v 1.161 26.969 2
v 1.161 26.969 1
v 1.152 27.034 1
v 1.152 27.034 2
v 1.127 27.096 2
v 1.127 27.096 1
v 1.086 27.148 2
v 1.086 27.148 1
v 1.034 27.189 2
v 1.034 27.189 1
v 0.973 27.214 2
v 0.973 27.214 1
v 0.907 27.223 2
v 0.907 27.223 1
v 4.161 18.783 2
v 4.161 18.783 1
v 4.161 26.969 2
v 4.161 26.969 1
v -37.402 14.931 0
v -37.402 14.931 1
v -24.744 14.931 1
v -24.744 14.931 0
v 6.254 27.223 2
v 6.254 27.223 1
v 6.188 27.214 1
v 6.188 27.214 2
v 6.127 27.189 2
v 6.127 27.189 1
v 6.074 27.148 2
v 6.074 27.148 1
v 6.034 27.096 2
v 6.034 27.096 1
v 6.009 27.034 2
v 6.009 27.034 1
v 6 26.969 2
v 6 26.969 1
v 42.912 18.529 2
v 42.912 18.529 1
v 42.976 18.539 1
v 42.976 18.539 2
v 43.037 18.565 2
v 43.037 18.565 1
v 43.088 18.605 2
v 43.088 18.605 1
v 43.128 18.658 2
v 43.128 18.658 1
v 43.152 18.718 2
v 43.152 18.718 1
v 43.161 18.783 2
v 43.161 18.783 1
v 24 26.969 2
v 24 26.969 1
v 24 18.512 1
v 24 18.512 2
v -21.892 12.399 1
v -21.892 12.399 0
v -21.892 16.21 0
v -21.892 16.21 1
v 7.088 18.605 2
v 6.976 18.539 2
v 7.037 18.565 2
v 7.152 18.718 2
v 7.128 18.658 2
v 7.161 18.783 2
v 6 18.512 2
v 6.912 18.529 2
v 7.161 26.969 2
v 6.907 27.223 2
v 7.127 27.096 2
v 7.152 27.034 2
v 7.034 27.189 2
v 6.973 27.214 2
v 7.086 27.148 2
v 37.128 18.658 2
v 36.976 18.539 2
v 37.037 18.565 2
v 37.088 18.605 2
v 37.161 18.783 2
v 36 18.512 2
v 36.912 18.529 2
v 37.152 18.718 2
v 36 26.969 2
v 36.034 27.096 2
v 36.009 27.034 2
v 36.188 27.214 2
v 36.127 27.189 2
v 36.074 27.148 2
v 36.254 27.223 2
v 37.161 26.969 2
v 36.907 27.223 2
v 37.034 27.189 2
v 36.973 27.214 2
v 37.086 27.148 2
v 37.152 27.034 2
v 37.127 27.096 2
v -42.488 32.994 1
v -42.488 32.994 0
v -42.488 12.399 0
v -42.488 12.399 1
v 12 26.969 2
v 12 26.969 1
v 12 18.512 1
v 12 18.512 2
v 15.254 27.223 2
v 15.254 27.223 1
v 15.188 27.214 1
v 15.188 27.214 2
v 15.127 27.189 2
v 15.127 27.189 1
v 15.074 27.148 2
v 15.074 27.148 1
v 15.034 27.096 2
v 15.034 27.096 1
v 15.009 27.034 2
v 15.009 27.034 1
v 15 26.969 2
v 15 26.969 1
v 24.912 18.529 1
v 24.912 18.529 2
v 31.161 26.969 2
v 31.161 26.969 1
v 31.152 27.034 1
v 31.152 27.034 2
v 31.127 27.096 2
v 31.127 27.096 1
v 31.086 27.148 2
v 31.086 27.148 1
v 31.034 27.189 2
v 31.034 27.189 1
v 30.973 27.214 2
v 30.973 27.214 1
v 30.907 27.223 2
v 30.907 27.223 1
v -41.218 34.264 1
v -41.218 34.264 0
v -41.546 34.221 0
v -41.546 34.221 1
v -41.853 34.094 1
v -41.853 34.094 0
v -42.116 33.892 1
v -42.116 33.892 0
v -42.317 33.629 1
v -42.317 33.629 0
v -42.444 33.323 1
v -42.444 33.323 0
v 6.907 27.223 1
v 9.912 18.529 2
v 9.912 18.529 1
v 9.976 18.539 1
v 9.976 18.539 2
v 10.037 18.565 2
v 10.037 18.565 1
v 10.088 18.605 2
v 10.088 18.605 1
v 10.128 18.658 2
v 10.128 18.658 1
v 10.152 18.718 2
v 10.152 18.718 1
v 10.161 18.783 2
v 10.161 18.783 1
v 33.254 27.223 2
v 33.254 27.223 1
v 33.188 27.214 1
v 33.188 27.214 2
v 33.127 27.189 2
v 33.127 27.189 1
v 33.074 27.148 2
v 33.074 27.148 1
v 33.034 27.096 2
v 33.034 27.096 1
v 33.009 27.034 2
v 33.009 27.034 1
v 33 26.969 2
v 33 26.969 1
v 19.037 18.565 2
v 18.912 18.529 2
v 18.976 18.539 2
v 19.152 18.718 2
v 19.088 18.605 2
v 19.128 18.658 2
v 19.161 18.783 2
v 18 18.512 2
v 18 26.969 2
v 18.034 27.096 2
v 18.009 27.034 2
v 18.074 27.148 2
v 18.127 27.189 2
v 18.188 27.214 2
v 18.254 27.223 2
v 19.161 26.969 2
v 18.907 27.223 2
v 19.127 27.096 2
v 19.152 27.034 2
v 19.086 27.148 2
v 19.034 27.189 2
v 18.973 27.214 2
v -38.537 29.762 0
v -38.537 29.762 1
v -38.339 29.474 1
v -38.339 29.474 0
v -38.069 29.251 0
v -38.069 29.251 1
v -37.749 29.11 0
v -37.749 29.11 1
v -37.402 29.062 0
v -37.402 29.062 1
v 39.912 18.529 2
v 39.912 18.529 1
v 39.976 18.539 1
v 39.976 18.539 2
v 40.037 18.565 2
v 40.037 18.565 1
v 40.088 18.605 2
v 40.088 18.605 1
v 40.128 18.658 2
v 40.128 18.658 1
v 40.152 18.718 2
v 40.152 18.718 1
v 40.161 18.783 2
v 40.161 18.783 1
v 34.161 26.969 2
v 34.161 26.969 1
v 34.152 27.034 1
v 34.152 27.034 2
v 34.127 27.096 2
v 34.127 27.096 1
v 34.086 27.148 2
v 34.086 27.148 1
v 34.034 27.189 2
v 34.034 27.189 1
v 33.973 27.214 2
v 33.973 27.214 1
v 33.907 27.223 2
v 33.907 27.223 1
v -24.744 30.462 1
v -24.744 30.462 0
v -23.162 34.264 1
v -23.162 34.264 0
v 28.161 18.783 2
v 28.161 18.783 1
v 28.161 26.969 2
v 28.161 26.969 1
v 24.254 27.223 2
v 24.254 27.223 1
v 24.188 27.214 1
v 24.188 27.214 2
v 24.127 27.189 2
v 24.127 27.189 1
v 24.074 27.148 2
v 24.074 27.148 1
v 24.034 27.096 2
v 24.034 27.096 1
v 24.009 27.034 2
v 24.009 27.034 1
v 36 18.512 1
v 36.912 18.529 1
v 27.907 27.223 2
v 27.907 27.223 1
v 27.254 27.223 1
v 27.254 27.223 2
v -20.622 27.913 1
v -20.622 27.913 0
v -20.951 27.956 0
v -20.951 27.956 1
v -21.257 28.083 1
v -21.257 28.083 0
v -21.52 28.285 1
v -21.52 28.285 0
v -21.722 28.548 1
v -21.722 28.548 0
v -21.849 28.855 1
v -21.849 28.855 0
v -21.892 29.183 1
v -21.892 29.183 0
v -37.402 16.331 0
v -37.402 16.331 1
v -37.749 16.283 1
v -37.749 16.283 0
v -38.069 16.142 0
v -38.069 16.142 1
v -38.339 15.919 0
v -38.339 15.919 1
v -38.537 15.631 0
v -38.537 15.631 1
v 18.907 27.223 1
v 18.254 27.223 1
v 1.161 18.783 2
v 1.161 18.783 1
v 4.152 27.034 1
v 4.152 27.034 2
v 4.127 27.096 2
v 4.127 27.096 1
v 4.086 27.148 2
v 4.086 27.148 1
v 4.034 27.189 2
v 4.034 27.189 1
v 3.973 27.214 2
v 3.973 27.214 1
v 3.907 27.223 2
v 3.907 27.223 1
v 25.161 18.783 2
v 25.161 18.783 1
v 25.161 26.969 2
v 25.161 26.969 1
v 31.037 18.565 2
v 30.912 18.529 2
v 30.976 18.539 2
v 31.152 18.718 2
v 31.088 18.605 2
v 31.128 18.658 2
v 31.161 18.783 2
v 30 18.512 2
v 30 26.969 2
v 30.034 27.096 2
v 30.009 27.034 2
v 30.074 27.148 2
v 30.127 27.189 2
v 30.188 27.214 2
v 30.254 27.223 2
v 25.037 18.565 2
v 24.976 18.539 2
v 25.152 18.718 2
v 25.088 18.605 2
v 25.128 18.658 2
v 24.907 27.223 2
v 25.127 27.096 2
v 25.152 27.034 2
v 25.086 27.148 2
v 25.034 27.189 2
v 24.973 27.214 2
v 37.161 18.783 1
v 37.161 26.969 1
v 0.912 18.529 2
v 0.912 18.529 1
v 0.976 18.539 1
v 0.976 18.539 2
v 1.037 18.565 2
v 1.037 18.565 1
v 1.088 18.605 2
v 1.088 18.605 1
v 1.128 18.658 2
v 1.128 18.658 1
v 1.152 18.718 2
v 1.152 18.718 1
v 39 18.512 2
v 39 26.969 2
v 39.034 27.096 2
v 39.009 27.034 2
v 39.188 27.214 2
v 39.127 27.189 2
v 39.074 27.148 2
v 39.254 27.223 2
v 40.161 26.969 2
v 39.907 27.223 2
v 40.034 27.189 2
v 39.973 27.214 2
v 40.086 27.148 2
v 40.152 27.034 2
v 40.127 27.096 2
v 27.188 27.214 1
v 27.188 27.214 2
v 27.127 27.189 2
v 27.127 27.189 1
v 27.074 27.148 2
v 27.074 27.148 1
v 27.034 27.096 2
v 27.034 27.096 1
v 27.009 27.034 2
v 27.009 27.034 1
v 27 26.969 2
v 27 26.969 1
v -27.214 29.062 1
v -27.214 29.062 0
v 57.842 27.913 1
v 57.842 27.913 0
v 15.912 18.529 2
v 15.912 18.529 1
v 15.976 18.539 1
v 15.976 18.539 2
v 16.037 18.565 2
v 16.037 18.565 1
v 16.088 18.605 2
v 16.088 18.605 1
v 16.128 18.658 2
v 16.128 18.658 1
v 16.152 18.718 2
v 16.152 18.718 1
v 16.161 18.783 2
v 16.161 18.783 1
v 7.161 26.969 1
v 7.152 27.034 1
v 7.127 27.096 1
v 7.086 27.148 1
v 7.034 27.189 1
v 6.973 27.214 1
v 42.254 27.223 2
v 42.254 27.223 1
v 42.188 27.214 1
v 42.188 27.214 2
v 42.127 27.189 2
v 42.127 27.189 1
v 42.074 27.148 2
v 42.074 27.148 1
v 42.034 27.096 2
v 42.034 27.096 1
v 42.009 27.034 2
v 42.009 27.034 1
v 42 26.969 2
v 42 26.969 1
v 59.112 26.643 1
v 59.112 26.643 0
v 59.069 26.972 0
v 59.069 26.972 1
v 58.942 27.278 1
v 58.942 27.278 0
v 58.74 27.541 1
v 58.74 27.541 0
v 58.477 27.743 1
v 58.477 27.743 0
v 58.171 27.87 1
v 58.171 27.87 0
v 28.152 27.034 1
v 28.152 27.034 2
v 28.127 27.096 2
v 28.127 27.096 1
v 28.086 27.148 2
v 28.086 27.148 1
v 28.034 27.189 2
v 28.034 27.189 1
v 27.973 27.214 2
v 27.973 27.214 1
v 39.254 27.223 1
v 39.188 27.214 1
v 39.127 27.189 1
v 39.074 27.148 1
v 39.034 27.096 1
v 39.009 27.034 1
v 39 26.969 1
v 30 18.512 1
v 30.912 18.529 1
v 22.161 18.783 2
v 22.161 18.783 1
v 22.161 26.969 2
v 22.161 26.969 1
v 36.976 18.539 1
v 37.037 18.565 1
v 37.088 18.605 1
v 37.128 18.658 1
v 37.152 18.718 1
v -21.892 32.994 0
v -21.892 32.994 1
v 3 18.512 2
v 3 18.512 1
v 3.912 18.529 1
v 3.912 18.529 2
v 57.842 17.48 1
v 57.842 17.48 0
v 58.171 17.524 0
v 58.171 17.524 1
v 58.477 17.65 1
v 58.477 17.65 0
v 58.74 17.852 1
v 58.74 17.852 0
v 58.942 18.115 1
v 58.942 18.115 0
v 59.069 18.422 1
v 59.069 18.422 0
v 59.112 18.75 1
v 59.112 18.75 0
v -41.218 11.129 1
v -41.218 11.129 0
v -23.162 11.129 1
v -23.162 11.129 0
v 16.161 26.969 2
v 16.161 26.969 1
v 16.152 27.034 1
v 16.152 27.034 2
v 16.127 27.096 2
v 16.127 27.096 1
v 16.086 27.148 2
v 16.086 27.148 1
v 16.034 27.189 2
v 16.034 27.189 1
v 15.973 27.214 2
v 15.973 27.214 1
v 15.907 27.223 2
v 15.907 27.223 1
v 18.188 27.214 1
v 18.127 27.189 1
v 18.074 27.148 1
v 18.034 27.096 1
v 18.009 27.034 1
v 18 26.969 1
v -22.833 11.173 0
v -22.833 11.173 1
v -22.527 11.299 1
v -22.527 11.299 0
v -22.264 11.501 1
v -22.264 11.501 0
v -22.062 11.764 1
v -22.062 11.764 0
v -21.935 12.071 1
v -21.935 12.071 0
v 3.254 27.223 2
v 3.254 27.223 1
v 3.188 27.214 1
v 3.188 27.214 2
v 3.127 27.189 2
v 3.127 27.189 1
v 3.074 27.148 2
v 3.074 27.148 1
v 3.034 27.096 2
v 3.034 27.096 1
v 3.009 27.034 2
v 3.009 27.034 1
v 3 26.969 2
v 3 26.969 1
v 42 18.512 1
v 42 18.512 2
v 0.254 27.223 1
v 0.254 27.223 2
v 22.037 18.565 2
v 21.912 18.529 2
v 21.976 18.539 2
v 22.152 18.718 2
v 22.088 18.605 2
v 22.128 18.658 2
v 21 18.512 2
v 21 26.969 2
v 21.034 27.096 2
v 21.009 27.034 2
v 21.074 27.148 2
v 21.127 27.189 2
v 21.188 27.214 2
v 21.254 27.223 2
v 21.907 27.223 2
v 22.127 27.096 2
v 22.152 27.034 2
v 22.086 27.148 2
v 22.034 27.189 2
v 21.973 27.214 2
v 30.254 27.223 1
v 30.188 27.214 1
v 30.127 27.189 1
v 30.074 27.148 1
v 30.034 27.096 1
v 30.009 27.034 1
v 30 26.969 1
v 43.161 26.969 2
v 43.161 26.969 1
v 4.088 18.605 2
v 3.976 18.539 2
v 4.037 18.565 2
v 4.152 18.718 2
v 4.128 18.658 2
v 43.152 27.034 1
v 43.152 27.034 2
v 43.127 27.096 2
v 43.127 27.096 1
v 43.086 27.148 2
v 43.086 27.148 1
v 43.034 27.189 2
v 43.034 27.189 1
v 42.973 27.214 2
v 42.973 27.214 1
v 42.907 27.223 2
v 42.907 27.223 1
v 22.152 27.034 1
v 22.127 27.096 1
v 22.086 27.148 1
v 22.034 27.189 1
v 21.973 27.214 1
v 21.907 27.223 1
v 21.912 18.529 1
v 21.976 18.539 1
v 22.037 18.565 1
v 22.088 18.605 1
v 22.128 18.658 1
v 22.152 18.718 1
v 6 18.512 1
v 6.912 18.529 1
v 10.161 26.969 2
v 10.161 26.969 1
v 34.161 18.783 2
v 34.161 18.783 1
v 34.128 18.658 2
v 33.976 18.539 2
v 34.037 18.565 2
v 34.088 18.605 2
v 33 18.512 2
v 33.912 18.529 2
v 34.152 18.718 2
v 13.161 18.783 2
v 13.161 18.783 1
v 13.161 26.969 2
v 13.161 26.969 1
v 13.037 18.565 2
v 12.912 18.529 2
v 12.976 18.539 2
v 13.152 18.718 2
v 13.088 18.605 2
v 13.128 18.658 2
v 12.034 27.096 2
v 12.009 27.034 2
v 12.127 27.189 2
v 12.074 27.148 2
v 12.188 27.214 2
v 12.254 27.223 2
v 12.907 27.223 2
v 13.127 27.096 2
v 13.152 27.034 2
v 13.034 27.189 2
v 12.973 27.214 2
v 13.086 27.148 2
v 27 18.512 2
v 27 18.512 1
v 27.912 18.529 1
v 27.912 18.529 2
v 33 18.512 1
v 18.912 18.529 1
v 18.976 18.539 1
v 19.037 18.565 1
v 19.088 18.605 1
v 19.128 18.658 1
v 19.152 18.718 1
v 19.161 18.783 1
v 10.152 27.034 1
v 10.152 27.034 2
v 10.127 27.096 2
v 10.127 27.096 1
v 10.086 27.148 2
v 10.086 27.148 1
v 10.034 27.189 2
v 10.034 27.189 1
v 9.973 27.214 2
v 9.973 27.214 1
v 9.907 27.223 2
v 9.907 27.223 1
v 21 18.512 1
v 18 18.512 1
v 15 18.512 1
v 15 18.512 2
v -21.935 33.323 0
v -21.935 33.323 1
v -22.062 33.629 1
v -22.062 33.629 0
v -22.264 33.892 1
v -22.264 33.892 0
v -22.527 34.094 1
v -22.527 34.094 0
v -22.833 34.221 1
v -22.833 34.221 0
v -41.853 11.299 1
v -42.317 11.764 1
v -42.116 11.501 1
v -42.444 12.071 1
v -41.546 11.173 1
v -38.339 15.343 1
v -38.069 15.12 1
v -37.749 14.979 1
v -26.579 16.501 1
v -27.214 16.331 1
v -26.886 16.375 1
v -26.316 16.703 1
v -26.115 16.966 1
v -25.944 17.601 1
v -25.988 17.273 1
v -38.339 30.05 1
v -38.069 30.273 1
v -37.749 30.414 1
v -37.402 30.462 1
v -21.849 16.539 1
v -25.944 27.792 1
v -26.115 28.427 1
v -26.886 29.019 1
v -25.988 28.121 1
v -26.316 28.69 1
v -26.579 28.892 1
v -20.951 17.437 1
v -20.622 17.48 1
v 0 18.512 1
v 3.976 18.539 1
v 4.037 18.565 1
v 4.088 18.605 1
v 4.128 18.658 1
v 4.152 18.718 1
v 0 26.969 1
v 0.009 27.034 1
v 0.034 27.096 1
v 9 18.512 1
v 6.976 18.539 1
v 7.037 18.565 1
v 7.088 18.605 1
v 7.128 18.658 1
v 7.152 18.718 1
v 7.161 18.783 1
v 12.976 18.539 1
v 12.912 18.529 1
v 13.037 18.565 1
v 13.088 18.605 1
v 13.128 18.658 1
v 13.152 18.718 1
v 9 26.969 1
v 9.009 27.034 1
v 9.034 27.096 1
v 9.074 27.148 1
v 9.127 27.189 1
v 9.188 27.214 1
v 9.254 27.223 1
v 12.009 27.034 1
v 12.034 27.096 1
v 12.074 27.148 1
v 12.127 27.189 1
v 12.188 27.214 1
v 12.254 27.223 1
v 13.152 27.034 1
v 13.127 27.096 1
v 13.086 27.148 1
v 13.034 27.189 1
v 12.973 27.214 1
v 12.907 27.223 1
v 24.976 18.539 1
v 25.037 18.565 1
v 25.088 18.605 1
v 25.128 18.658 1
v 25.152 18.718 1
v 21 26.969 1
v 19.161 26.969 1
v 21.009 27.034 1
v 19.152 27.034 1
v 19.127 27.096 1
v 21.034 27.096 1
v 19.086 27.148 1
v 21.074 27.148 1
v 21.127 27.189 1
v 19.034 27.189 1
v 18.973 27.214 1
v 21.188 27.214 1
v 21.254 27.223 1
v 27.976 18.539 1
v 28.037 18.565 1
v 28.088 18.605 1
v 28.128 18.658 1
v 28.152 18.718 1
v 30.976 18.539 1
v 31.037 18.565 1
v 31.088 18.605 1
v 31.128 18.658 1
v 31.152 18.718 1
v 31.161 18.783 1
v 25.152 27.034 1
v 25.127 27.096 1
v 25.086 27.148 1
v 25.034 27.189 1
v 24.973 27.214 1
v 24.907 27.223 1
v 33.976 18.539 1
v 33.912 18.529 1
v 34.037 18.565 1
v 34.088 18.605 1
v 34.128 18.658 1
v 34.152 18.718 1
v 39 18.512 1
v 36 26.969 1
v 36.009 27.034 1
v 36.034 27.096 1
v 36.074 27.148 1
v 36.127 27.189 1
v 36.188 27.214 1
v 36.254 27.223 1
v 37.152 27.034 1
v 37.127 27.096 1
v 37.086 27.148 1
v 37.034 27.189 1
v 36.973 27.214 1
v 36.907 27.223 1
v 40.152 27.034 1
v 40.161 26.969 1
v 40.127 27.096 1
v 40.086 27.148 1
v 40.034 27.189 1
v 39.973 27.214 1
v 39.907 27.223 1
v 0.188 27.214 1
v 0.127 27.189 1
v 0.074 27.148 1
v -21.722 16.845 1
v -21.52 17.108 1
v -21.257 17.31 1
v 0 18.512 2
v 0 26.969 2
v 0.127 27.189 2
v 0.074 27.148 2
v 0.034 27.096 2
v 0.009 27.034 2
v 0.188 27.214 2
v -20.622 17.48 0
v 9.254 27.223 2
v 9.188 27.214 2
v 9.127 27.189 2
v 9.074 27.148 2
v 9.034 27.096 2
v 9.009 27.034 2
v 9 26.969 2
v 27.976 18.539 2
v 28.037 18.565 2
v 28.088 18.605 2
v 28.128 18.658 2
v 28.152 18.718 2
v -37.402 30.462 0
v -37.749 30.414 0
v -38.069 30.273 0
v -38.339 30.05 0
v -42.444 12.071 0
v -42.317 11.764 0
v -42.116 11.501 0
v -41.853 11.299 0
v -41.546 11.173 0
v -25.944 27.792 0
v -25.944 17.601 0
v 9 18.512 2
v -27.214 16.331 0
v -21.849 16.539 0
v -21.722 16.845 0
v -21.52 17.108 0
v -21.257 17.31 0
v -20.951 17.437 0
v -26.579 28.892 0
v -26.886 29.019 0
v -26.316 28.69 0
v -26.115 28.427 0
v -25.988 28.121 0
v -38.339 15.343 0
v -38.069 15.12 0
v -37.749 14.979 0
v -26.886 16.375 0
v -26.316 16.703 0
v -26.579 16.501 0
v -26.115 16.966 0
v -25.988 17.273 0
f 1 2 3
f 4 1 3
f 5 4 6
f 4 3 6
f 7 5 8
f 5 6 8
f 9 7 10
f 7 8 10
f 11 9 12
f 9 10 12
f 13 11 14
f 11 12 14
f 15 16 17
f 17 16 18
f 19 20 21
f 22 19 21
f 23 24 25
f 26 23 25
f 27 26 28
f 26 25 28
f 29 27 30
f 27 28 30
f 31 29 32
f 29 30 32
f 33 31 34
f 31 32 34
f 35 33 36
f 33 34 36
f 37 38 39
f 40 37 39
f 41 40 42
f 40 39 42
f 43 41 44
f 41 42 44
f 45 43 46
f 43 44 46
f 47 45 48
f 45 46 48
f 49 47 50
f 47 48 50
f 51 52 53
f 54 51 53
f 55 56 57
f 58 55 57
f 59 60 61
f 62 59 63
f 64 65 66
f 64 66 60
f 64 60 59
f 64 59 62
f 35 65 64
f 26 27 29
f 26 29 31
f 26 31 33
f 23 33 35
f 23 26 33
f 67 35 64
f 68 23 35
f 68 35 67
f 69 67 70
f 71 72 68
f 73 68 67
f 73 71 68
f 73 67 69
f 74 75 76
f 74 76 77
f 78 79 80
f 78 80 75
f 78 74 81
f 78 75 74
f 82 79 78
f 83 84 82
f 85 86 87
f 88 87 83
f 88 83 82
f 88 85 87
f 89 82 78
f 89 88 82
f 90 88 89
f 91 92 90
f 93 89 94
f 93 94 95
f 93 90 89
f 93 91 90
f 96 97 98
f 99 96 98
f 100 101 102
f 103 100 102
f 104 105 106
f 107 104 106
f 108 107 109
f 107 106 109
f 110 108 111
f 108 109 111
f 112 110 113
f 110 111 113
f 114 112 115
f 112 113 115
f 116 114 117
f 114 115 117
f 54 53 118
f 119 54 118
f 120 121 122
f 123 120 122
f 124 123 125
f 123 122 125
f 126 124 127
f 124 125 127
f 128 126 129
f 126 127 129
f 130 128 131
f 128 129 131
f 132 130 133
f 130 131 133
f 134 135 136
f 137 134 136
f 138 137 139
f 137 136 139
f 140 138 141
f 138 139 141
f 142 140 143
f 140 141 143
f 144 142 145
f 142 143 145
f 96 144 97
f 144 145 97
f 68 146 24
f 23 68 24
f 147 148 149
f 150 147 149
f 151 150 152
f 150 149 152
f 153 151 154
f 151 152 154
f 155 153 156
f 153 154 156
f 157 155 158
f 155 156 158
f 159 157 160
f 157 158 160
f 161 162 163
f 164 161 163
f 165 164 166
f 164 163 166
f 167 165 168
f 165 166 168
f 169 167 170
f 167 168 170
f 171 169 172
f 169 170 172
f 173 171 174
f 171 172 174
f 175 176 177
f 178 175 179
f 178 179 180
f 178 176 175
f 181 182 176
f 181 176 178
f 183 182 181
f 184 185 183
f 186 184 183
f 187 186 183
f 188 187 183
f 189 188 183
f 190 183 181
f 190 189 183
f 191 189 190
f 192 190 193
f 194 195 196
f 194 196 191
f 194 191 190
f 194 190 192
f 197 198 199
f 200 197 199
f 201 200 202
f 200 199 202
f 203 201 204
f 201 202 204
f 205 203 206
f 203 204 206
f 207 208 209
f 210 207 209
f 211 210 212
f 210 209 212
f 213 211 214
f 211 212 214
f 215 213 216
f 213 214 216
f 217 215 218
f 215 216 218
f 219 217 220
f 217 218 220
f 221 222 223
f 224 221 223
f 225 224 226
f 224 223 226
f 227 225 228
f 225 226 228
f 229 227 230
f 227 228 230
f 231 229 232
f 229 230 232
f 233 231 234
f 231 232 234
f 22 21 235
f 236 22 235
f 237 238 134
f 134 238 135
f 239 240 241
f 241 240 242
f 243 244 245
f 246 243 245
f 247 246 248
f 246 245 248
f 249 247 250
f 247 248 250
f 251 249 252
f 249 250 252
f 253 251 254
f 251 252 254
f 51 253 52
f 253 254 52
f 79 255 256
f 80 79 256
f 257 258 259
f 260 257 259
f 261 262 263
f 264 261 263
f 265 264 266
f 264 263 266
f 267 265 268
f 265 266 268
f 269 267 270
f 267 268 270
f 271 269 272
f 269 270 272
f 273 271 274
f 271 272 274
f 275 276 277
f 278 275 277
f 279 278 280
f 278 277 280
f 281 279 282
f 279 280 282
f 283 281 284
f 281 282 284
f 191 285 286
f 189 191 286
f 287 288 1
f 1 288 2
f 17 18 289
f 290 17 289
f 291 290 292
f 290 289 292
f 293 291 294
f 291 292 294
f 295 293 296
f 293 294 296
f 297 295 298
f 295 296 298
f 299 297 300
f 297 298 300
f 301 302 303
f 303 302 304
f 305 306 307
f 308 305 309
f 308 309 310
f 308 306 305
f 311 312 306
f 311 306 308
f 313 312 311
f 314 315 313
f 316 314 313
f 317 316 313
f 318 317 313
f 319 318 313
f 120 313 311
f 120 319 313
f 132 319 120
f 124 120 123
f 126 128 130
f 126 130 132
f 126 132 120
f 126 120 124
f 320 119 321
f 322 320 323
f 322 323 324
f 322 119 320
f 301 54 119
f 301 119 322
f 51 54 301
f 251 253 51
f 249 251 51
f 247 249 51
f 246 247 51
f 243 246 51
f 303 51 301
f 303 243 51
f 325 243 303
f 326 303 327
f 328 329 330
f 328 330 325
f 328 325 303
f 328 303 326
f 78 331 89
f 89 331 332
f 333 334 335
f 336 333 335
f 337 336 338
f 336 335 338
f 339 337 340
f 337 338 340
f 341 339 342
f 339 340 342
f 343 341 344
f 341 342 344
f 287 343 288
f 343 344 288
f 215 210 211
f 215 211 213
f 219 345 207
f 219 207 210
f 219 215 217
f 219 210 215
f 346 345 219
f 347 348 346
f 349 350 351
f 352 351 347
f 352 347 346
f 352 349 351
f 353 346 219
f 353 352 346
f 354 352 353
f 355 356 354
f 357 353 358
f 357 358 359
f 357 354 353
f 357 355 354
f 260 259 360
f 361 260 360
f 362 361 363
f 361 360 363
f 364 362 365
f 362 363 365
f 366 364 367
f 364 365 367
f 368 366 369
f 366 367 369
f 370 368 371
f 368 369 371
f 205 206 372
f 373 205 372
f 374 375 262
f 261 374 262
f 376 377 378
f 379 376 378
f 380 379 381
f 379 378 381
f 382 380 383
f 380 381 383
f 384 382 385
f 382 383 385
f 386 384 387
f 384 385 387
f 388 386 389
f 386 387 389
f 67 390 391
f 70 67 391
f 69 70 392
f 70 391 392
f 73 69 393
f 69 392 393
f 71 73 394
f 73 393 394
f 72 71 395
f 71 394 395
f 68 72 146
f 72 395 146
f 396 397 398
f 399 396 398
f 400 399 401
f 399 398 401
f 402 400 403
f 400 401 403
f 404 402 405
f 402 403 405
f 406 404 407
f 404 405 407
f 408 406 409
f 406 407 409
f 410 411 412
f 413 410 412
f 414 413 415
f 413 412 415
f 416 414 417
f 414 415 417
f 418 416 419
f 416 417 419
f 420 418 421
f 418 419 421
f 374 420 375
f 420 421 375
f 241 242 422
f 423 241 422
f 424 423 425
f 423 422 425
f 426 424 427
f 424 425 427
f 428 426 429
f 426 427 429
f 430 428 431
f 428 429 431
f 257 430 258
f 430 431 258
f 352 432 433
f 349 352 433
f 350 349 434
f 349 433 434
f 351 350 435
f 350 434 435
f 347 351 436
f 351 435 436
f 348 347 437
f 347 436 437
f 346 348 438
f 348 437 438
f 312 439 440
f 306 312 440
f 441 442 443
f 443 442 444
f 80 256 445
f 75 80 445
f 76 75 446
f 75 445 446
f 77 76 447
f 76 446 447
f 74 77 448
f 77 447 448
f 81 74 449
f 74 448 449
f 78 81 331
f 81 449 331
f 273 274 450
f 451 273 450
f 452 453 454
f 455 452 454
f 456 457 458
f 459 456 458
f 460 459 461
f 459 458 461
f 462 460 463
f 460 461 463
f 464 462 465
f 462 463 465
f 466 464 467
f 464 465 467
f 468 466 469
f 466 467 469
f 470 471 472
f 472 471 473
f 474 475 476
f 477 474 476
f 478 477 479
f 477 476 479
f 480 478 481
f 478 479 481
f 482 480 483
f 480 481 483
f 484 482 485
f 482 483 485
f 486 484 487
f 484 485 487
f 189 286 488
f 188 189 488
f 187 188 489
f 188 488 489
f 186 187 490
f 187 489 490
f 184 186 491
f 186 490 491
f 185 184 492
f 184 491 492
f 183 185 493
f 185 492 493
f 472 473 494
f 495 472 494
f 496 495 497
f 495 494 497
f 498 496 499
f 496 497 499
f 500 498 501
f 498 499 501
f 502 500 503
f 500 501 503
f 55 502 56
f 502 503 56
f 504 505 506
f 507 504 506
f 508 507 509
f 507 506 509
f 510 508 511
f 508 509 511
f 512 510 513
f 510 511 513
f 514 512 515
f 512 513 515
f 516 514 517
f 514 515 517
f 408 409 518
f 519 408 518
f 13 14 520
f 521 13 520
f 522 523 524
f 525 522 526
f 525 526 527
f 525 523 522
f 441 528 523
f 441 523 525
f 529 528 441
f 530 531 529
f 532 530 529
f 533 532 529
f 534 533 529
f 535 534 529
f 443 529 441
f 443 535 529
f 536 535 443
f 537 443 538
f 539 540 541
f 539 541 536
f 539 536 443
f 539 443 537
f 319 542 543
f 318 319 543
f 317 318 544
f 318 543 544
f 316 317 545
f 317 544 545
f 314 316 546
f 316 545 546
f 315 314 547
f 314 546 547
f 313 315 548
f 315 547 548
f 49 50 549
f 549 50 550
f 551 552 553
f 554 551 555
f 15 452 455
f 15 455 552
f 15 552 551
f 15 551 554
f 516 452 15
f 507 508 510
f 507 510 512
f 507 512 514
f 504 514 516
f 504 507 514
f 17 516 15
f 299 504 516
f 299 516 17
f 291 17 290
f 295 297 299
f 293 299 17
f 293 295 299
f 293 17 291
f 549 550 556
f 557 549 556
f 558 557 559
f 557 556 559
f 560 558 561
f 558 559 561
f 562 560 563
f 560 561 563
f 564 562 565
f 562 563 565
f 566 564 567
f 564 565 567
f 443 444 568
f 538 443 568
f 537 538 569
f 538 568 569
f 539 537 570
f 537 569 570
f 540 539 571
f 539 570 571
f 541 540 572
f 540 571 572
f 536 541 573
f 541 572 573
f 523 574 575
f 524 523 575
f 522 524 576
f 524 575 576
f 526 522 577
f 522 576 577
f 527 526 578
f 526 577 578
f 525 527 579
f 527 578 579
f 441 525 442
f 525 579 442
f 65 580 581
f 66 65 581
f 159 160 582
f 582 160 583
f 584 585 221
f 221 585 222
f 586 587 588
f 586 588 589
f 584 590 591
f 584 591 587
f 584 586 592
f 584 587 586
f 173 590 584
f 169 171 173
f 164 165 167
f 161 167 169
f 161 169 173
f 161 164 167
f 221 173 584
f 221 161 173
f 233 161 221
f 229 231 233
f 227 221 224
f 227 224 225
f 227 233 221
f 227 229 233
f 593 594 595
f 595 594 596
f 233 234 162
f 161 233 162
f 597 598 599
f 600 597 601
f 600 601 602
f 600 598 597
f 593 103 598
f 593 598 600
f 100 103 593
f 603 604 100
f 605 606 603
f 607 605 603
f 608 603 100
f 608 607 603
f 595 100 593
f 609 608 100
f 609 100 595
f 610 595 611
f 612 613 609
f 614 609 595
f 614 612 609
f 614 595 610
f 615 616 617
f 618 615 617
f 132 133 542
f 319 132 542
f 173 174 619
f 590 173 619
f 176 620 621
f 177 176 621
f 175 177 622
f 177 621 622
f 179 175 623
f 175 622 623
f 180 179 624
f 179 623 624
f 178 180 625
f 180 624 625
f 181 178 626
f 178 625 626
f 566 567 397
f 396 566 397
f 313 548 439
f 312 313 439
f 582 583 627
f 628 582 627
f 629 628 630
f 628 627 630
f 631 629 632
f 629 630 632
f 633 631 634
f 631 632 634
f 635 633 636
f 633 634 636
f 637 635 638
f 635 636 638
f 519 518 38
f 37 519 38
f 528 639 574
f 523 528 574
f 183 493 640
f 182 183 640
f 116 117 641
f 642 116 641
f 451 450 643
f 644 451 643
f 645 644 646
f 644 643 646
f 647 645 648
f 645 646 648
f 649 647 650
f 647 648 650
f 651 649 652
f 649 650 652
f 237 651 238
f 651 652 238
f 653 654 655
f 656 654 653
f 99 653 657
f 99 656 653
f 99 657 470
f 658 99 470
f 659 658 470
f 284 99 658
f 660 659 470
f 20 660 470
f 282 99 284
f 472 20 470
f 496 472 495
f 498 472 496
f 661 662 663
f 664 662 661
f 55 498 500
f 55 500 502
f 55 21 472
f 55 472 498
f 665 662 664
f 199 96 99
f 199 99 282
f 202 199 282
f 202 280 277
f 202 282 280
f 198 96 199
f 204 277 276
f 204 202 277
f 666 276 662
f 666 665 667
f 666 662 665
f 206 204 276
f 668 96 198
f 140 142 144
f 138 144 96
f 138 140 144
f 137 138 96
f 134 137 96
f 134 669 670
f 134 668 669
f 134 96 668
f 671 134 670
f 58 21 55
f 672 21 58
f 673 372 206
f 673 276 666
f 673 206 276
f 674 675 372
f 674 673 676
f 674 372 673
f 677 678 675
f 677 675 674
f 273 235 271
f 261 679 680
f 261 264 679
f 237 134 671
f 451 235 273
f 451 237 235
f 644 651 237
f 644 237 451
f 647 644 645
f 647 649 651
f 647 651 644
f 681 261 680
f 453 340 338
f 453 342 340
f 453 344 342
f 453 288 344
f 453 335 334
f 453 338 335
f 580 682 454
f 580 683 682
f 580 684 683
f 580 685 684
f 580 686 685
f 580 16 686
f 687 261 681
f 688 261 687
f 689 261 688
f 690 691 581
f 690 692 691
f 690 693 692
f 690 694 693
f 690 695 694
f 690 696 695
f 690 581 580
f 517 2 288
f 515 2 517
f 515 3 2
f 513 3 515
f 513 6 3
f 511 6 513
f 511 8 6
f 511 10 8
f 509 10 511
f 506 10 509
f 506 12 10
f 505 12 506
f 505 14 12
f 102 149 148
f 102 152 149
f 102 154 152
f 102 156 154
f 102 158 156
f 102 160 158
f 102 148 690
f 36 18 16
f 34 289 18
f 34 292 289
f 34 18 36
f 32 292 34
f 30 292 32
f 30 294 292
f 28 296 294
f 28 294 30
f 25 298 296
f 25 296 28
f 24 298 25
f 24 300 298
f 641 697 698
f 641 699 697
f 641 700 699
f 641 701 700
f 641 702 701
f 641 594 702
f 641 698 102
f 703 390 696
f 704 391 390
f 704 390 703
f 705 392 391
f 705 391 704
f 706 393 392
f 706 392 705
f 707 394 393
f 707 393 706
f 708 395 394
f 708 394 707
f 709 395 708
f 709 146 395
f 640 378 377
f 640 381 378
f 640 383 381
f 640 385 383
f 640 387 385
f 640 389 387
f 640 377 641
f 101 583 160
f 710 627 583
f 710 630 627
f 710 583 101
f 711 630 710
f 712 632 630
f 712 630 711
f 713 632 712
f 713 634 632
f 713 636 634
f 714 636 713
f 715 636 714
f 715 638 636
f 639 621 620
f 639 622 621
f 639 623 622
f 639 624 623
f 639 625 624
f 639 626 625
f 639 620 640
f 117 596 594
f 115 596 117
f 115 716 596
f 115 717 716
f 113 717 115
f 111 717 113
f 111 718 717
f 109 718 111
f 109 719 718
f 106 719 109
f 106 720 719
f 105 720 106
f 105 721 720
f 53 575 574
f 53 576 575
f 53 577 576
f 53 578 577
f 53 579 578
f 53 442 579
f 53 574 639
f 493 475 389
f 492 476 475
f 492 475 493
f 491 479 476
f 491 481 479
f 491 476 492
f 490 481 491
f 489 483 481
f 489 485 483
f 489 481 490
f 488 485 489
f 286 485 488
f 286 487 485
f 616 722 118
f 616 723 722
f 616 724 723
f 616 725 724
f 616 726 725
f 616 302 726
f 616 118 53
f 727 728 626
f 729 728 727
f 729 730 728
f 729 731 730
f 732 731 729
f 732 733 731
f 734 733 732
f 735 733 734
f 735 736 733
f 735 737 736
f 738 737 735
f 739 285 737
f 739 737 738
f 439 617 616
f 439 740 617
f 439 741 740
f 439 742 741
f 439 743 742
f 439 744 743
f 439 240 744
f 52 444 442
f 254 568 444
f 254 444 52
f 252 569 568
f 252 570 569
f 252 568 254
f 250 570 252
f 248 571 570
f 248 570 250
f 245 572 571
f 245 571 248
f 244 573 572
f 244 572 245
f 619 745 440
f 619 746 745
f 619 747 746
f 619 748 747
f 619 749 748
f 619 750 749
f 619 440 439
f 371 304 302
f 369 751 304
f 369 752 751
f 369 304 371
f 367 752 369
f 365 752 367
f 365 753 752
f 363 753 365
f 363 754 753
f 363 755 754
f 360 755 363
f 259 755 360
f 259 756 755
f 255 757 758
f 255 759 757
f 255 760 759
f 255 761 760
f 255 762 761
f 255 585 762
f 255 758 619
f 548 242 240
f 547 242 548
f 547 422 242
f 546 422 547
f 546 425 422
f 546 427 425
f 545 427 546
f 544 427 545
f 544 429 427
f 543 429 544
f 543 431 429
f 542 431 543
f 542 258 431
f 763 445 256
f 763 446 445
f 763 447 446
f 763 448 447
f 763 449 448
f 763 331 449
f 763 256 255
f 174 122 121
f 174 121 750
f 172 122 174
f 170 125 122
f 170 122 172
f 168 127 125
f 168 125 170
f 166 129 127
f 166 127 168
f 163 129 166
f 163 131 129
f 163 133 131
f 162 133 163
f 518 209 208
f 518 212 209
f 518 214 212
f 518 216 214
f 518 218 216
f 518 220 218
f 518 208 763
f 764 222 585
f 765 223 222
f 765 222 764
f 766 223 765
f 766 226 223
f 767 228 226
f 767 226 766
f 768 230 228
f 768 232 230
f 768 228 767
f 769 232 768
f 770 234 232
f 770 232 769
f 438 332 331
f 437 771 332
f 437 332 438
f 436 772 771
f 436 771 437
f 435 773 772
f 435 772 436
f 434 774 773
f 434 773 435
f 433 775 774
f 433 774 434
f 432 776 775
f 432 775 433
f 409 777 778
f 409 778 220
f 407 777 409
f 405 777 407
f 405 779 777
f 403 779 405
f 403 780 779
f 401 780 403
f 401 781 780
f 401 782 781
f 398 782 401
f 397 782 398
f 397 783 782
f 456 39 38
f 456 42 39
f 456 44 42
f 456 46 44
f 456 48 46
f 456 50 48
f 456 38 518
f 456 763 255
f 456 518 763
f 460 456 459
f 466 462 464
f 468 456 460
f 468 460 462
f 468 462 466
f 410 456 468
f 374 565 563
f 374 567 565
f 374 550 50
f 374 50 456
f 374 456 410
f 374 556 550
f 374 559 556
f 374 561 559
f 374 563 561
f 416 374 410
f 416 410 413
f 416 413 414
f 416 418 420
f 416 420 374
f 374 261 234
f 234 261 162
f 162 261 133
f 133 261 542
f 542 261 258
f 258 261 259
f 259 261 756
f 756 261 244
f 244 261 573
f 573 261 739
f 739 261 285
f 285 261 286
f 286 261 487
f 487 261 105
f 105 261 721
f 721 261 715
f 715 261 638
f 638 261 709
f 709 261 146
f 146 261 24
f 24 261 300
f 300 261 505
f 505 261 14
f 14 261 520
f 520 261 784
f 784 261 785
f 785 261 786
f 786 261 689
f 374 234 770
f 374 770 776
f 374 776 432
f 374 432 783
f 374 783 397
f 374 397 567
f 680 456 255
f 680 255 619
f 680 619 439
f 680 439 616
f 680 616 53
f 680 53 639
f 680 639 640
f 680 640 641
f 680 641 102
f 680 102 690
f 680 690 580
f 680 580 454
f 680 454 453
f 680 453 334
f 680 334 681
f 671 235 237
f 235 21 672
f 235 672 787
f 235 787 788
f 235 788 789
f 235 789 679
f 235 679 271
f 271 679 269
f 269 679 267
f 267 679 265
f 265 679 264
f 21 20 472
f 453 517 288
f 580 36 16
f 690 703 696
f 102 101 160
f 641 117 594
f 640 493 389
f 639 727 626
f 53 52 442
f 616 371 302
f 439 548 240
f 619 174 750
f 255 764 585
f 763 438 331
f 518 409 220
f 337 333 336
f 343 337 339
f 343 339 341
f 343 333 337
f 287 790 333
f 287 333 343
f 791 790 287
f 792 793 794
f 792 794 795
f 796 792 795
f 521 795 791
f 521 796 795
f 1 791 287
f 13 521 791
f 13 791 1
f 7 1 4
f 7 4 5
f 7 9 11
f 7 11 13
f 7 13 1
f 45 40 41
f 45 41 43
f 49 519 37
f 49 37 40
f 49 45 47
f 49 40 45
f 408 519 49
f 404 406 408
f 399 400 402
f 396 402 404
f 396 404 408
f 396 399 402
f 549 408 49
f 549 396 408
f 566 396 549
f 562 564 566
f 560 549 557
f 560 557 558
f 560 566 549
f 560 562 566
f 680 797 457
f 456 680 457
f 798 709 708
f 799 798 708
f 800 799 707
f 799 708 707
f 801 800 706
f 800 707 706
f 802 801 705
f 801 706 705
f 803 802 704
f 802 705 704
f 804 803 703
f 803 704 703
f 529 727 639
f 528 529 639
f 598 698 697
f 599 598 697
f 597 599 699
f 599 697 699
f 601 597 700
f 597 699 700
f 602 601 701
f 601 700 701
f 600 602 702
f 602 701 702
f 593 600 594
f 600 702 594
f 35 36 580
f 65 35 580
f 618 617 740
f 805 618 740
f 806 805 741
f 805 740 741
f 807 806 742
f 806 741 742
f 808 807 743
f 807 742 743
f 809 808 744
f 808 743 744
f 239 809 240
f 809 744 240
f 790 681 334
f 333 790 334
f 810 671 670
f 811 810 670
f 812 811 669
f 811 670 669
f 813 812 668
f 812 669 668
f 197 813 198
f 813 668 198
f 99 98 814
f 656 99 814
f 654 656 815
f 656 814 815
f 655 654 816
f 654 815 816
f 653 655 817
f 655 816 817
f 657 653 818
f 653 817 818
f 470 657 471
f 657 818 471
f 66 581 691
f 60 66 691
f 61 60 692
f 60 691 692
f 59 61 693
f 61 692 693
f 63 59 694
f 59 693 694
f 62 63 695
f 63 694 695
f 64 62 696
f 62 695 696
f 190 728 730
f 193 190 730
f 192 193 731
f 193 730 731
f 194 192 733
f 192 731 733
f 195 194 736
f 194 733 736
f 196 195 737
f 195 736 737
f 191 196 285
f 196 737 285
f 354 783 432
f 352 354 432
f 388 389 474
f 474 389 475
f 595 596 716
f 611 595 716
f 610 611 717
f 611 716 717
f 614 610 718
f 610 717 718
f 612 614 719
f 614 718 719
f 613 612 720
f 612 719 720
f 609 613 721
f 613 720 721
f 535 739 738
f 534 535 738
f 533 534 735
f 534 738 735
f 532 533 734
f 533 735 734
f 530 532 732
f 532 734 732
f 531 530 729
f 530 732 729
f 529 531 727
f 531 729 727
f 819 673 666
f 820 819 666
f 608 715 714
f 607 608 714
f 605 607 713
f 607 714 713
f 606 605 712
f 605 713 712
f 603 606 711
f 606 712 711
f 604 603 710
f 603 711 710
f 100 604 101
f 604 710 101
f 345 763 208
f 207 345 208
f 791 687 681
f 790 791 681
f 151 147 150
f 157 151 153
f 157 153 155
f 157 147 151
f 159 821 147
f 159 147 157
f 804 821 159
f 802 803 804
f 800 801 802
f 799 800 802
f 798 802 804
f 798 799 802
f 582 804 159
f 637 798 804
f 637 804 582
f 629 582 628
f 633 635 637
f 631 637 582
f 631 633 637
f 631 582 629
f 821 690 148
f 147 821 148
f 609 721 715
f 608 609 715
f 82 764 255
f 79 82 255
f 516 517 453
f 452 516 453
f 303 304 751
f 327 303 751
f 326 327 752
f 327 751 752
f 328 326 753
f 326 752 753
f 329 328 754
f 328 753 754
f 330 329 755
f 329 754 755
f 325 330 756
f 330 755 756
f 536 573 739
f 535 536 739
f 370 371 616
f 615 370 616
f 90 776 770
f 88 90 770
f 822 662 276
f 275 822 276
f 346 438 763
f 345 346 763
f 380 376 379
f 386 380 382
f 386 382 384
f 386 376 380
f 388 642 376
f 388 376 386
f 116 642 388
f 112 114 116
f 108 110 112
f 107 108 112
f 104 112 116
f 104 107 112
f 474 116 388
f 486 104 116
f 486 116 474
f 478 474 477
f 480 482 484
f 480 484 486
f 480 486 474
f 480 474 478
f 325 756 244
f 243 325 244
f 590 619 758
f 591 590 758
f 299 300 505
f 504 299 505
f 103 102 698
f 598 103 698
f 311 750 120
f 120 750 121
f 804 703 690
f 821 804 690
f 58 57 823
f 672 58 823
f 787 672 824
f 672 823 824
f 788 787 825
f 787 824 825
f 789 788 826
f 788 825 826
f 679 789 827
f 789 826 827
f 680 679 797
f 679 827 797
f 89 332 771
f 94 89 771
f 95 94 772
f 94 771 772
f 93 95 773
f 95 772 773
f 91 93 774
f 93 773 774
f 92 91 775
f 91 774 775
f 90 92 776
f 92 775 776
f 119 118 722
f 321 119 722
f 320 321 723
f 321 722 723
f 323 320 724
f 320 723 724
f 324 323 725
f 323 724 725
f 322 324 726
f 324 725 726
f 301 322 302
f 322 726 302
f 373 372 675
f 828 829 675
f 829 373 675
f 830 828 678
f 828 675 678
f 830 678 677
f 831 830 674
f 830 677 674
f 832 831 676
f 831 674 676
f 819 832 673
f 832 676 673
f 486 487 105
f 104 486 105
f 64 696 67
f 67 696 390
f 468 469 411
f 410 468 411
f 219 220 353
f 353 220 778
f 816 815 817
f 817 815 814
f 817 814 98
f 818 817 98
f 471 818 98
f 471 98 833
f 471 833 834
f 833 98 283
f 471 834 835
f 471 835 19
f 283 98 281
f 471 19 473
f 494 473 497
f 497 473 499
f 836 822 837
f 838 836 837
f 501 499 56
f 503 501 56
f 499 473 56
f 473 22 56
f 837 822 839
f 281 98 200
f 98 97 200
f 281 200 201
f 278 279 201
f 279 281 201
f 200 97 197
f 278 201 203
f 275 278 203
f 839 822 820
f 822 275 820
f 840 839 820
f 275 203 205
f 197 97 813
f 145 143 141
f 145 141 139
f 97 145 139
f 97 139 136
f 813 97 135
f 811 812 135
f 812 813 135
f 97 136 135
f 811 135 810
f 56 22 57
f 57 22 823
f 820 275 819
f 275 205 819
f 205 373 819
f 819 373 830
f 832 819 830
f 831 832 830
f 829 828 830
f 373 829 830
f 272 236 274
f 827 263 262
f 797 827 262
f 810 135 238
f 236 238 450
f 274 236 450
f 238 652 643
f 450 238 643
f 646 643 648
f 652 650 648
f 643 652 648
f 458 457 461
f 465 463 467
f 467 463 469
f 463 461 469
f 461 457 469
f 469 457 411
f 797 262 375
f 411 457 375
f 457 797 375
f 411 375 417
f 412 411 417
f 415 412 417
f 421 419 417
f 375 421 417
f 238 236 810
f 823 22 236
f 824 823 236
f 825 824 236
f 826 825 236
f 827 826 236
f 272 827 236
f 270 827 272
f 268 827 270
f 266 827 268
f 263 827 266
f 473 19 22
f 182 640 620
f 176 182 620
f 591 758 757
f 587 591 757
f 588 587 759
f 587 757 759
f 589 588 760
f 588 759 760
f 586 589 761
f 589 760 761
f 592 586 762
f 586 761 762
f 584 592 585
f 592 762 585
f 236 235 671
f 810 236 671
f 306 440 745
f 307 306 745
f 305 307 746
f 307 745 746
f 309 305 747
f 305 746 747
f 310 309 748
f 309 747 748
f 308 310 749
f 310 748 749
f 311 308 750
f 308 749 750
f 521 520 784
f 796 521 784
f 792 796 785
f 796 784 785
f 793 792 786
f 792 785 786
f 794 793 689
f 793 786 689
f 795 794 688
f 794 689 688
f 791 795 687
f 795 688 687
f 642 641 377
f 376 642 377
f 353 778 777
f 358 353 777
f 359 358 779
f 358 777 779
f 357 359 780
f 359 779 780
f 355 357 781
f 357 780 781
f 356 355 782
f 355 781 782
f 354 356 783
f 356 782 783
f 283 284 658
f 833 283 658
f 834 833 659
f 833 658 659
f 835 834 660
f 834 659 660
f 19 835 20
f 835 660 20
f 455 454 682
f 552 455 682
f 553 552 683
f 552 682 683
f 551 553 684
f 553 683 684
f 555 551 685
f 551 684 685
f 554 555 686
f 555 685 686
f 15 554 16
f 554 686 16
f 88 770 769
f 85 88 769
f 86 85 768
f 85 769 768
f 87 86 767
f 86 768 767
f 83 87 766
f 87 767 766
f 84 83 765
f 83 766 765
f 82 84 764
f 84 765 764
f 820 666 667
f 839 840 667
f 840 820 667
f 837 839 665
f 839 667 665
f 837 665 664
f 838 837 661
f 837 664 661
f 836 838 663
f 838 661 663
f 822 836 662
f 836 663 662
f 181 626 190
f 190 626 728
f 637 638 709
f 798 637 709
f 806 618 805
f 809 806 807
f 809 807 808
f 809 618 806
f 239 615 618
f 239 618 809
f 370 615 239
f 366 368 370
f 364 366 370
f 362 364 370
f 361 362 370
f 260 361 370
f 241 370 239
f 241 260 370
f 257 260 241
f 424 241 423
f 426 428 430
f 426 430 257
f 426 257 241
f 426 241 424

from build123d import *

# Parameters (mm, degrees)
F1_DEPTH = 1
F3_DEPTH = 25.4
F5_DEPTH = 1


with BuildPart() as f1:
    # F0 (on Top) → F1 (new body)
    with BuildSketch(Plane.XY):
        with BuildLine():
            Line((57.842379, 27.913206), (-20.622115, 27.913206))
            ThreePointArc((-20.622115, 27.913206), (-21.520141, 28.285181), (-21.892115, 29.183206))
            Line((-21.892115, 29.183206), (-21.892115, 32.994207))
            ThreePointArc((-21.892115, 32.994207), (-22.26409, 33.892232), (-23.162115, 34.264207))
            Line((-23.162115, 34.264207), (-41.217621, 34.264207))
            ThreePointArc((-41.217621, 34.264207), (-42.115647, 33.892232), (-42.487621, 32.994207))
            Line((-42.487621, 32.994207), (-42.487621, 12.399233))
            ThreePointArc((-42.487621, 12.399233), (-42.115647, 11.501207), (-41.217621, 11.129233))
            Line((-41.217621, 11.129233), (-23.162115, 11.129233))
            ThreePointArc((-23.162115, 11.129233), (-22.26409, 11.501207), (-21.892115, 12.399233))
            Line((-21.892115, 12.399233), (-21.892115, 16.210233))
            ThreePointArc((-21.892115, 16.210233), (-21.520141, 17.108259), (-20.622115, 17.480233))
            Line((-20.622115, 17.480233), (57.842379, 17.480233))
            ThreePointArc((57.842379, 17.480233), (58.740404, 17.852208), (59.112379, 18.750233))
            Line((59.112379, 18.750233), (59.112379, 26.643206))
            ThreePointArc((59.112379, 26.643206), (58.740404, 27.541232), (57.842379, 27.913206))
        make_face()
        with BuildLine():
            ThreePointArc((-39.443586, 15.963525), (-39.40935, 15.670629), (-39.308487, 15.393525))
            ThreePointArc((-39.308487, 15.393525), (-39.40935, 15.116421), (-39.443586, 14.823525))
            Line((-39.443586, 14.823525), (-39.443586, 15.963525))
        make_face(mode=Mode.SUBTRACT)
        with BuildLine():
            ThreePointArc((-39.308487, 29.999914), (-38.840294, 30.51084), (-38.173586, 30.699914))
            Line((-38.173586, 30.699914), (-25.515855, 30.699914))
            Line((-25.515855, 30.699914), (-25.515855, 14.693525))
            Line((-25.515855, 14.693525), (-38.173586, 14.693525))
            ThreePointArc((-38.173586, 14.693525), (-38.840294, 14.8826), (-39.308487, 15.393525))
            ThreePointArc((-39.308487, 15.393525), (-38.840294, 15.904451), (-38.173586, 16.093525))
            Line((-38.173586, 16.093525), (-27.985855, 16.093525))
            ThreePointArc((-27.985855, 16.093525), (-27.087829, 16.4655), (-26.715855, 17.363525))
            Line((-26.715855, 17.363525), (-26.715855, 28.029914))
            ThreePointArc((-26.715855, 28.029914), (-27.087829, 28.92794), (-27.985855, 29.299914))
            Line((-27.985855, 29.299914), (-38.173586, 29.299914))
            ThreePointArc((-38.173586, 29.299914), (-38.840294, 29.488989), (-39.308487, 29.999914))
        make_face(mode=Mode.SUBTRACT)
        with BuildLine():
            ThreePointArc((-39.443586, 30.569914), (-39.40935, 30.277019), (-39.308487, 29.999914))
            ThreePointArc((-39.308487, 29.999914), (-39.40935, 29.72281), (-39.443586, 29.429914))
            Line((-39.443586, 29.429914), (-39.443586, 30.569914))
        make_face(mode=Mode.SUBTRACT)
        with BuildLine():
            Line((-25.515855, 30.699914), (-38.173586, 30.699914))
            ThreePointArc((-38.173586, 30.699914), (-38.840294, 30.51084), (-39.308487, 29.999914))
            ThreePointArc((-39.308487, 29.999914), (-38.840294, 29.488989), (-38.173586, 29.299914))
            Line((-38.173586, 29.299914), (-27.985855, 29.299914))
            ThreePointArc((-27.985855, 29.299914), (-27.087829, 28.92794), (-26.715855, 28.029914))
            Line((-26.715855, 28.029914), (-26.715855, 17.363525))
            ThreePointArc((-26.715855, 17.363525), (-27.087829, 16.4655), (-27.985855, 16.093525))
            Line((-27.985855, 16.093525), (-38.173586, 16.093525))
            ThreePointArc((-38.173586, 16.093525), (-38.840294, 15.904451), (-39.308487, 15.393525))
            ThreePointArc((-39.308487, 15.393525), (-38.840294, 14.8826), (-38.173586, 14.693525))
            Line((-38.173586, 14.693525), (-25.515855, 14.693525))
            Line((-25.515855, 14.693525), (-25.515855, 30.699914))
        make_face()
        with BuildLine():
            ThreePointArc((-39.443586, 29.429914), (-39.40935, 29.72281), (-39.308487, 29.999914))
            ThreePointArc((-39.308487, 29.999914), (-39.40935, 30.277019), (-39.443586, 30.569914))
            Line((-39.443586, 30.569914), (-39.443586, 29.429914))
        make_face()
        with BuildLine():
            ThreePointArc((-39.443586, 14.823525), (-39.40935, 15.116421), (-39.308487, 15.393525))
            ThreePointArc((-39.308487, 15.393525), (-39.40935, 15.670629), (-39.443586, 15.963525))
            Line((-39.443586, 15.963525), (-39.443586, 14.823525))
        make_face()
    extrude(amount=F1_DEPTH)

    # F2 (on face) → F3 (cut)
    with BuildSketch(Plane.XY.offset(1)):
        with BuildLine():
            Line((-32.294963, 30.462175), (-37.402193, 30.462175))
            ThreePointArc((-37.402193, 30.462175), (-38.068901, 30.273101), (-38.537094, 29.762175))
            ThreePointArc((-38.537094, 29.762175), (-38.068901, 29.251249), (-37.402193, 29.062175))
            Line((-37.402193, 29.062175), (-27.214462, 29.062175))
            ThreePointArc((-27.214462, 29.062175), (-26.316436, 28.690201), (-25.944462, 27.792175))
            Line((-25.944462, 27.792175), (-25.944462, 17.601265))
            ThreePointArc((-25.944462, 17.601265), (-26.316436, 16.703239), (-27.214462, 16.331265))
            Line((-27.214462, 16.331265), (-37.402193, 16.331265))
            ThreePointArc((-37.402193, 16.331265), (-38.068901, 16.14219), (-38.537094, 15.631265))
            ThreePointArc((-38.537094, 15.631265), (-38.068901, 15.120339), (-37.402193, 14.931265))
            Line((-37.402193, 14.931265), (-32.189868, 14.931265))
            Line((-32.189868, 14.931265), (-24.744462, 14.931265))
            Line((-24.744462, 14.931265), (-24.744462, 30.462175))
            Line((-24.744462, 30.462175), (-32.294963, 30.462175))
        make_face()
    extrude(amount=-F3_DEPTH, mode=Mode.SUBTRACT)

    # F4 (on face) → F5 (join)
    with BuildSketch(Plane.XY.offset(1)):
        with BuildLine():
            Line((0.906816, 27.222619), (0.254, 27.222619))
            ThreePointArc((0.254, 27.222619), (0.074395, 27.148224), (0, 26.968619))
            Line((0, 26.968619), (0, 18.512206))
            Line((0, 18.512206), (0.911544, 18.529177))
            ThreePointArc((0.911544, 18.529177), (1.088085, 18.605208), (1.160816, 18.783133))
            Line((1.160816, 18.783133), (1.160816, 26.968619))
            ThreePointArc((1.160816, 26.968619), (1.086421, 27.148224), (0.906816, 27.222619))
        make_face()
        with BuildLine():
            Line((3.906816, 27.222619), (3.254, 27.222619))
            ThreePointArc((3.254, 27.222619), (3.074395, 27.148224), (3, 26.968619))
            Line((3, 26.968619), (3, 18.512206))
            Line((3, 18.512206), (3.911544, 18.529177))
            ThreePointArc((3.911544, 18.529177), (4.088085, 18.605208), (4.160816, 18.783133))
            Line((4.160816, 18.783133), (4.160816, 26.968619))
            ThreePointArc((4.160816, 26.968619), (4.086421, 27.148224), (3.906816, 27.222619))
        make_face()
        with BuildLine():
            Line((6.906816, 27.222619), (6.254, 27.222619))
            ThreePointArc((6.254, 27.222619), (6.074395, 27.148224), (6, 26.968619))
            Line((6, 26.968619), (6, 18.512206))
            Line((6, 18.512206), (6.911544, 18.529177))
            ThreePointArc((6.911544, 18.529177), (7.088085, 18.605208), (7.160816, 18.783133))
            Line((7.160816, 18.783133), (7.160816, 26.968619))
            ThreePointArc((7.160816, 26.968619), (7.086421, 27.148224), (6.906816, 27.222619))
        make_face()
        with BuildLine():
            Line((9.906816, 27.222619), (9.254, 27.222619))
            ThreePointArc((9.254, 27.222619), (9.074395, 27.148224), (9, 26.968619))
            Line((9, 26.968619), (9, 18.512206))
            Line((9, 18.512206), (9.911544, 18.529177))
            ThreePointArc((9.911544, 18.529177), (10.088085, 18.605208), (10.160816, 18.783133))
            Line((10.160816, 18.783133), (10.160816, 26.968619))
            ThreePointArc((10.160816, 26.968619), (10.086421, 27.148224), (9.906816, 27.222619))
        make_face()
        with BuildLine():
            Line((12.906816, 27.222619), (12.254, 27.222619))
            ThreePointArc((12.254, 27.222619), (12.074395, 27.148224), (12, 26.968619))
            Line((12, 26.968619), (12, 18.512206))
            Line((12, 18.512206), (12.911544, 18.529177))
            ThreePointArc((12.911544, 18.529177), (13.088085, 18.605208), (13.160816, 18.783133))
            Line((13.160816, 18.783133), (13.160816, 26.968619))
            ThreePointArc((13.160816, 26.968619), (13.086421, 27.148224), (12.906816, 27.222619))
        make_face()
        with BuildLine():
            Line((15.906816, 27.222619), (15.254, 27.222619))
            ThreePointArc((15.254, 27.222619), (15.074395, 27.148224), (15, 26.968619))
            Line((15, 26.968619), (15, 18.512206))
            Line((15, 18.512206), (15.911544, 18.529177))
            ThreePointArc((15.911544, 18.529177), (16.088085, 18.605208), (16.160816, 18.783133))
            Line((16.160816, 18.783133), (16.160816, 26.968619))
            ThreePointArc((16.160816, 26.968619), (16.086421, 27.148224), (15.906816, 27.222619))
        make_face()
        with BuildLine():
            Line((18.906816, 27.222619), (18.254, 27.222619))
            ThreePointArc((18.254, 27.222619), (18.074395, 27.148224), (18, 26.968619))
            Line((18, 26.968619), (18, 18.512206))
            Line((18, 18.512206), (18.911544, 18.529177))
            ThreePointArc((18.911544, 18.529177), (19.088085, 18.605208), (19.160816, 18.783133))
            Line((19.160816, 18.783133), (19.160816, 26.968619))
            ThreePointArc((19.160816, 26.968619), (19.086421, 27.148224), (18.906816, 27.222619))
        make_face()
        with BuildLine():
            Line((42.906816, 27.222619), (42.254, 27.222619))
            ThreePointArc((42.254, 27.222619), (42.074395, 27.148224), (42, 26.968619))
            Line((42, 26.968619), (42, 18.512206))
            Line((42, 18.512206), (42.911544, 18.529177))
            ThreePointArc((42.911544, 18.529177), (43.088085, 18.605208), (43.160816, 18.783133))
            Line((43.160816, 18.783133), (43.160816, 26.968619))
            ThreePointArc((43.160816, 26.968619), (43.086421, 27.148224), (42.906816, 27.222619))
        make_face()
        with BuildLine():
            Line((39.906816, 27.222619), (39.254, 27.222619))
            ThreePointArc((39.254, 27.222619), (39.074395, 27.148224), (39, 26.968619))
            Line((39, 26.968619), (39, 18.512206))
            Line((39, 18.512206), (39.911544, 18.529177))
            ThreePointArc((39.911544, 18.529177), (40.088085, 18.605208), (40.160816, 18.783133))
            Line((40.160816, 18.783133), (40.160816, 26.968619))
            ThreePointArc((40.160816, 26.968619), (40.086421, 27.148224), (39.906816, 27.222619))
        make_face()
        with BuildLine():
            Line((36.906816, 27.222619), (36.254, 27.222619))
            ThreePointArc((36.254, 27.222619), (36.074395, 27.148224), (36, 26.968619))
            Line((36, 26.968619), (36, 18.512206))
            Line((36, 18.512206), (36.911544, 18.529177))
            ThreePointArc((36.911544, 18.529177), (37.088085, 18.605208), (37.160816, 18.783133))
            Line((37.160816, 18.783133), (37.160816, 26.968619))
            ThreePointArc((37.160816, 26.968619), (37.086421, 27.148224), (36.906816, 27.222619))
        make_face()
        with BuildLine():
            Line((33.906816, 27.222619), (33.254, 27.222619))
            ThreePointArc((33.254, 27.222619), (33.074395, 27.148224), (33, 26.968619))
            Line((33, 26.968619), (33, 18.512206))
            Line((33, 18.512206), (33.911544, 18.529177))
            ThreePointArc((33.911544, 18.529177), (34.088085, 18.605208), (34.160816, 18.783133))
            Line((34.160816, 18.783133), (34.160816, 26.968619))
            ThreePointArc((34.160816, 26.968619), (34.086421, 27.148224), (33.906816, 27.222619))
        make_face()
        with BuildLine():
            Line((30.906816, 27.222619), (30.254, 27.222619))
            ThreePointArc((30.254, 27.222619), (30.074395, 27.148224), (30, 26.968619))
            Line((30, 26.968619), (30, 18.512206))
            Line((30, 18.512206), (30.911544, 18.529177))
            ThreePointArc((30.911544, 18.529177), (31.088085, 18.605208), (31.160816, 18.783133))
            Line((31.160816, 18.783133), (31.160816, 26.968619))
            ThreePointArc((31.160816, 26.968619), (31.086421, 27.148224), (30.906816, 27.222619))
        make_face()
        with BuildLine():
            Line((27.906816, 27.222619), (27.254, 27.222619))
            ThreePointArc((27.254, 27.222619), (27.074395, 27.148224), (27, 26.968619))
            Line((27, 26.968619), (27, 18.512206))
            Line((27, 18.512206), (27.911544, 18.529177))
            ThreePointArc((27.911544, 18.529177), (28.088085, 18.605208), (28.160816, 18.783133))
            Line((28.160816, 18.783133), (28.160816, 26.968619))
            ThreePointArc((28.160816, 26.968619), (28.086421, 27.148224), (27.906816, 27.222619))
        make_face()
        with BuildLine():
            Line((24.906816, 27.222619), (24.254, 27.222619))
            ThreePointArc((24.254, 27.222619), (24.074395, 27.148224), (24, 26.968619))
            Line((24, 26.968619), (24, 18.512206))
            Line((24, 18.512206), (24.911544, 18.529177))
            ThreePointArc((24.911544, 18.529177), (25.088085, 18.605208), (25.160816, 18.783133))
            Line((25.160816, 18.783133), (25.160816, 26.968619))
            ThreePointArc((25.160816, 26.968619), (25.086421, 27.148224), (24.906816, 27.222619))
        make_face()
        with BuildLine():
            Line((21.906816, 27.222619), (21.254, 27.222619))
            ThreePointArc((21.254, 27.222619), (21.074395, 27.148224), (21, 26.968619))
            Line((21, 26.968619), (21, 18.512206))
            Line((21, 18.512206), (21.911544, 18.529177))
            ThreePointArc((21.911544, 18.529177), (22.088085, 18.605208), (22.160816, 18.783133))
            Line((22.160816, 18.783133), (22.160816, 26.968619))
            ThreePointArc((22.160816, 26.968619), (22.086421, 27.148224), (21.906816, 27.222619))
        make_face()
    extrude(amount=F5_DEPTH)


solid = f1.part
